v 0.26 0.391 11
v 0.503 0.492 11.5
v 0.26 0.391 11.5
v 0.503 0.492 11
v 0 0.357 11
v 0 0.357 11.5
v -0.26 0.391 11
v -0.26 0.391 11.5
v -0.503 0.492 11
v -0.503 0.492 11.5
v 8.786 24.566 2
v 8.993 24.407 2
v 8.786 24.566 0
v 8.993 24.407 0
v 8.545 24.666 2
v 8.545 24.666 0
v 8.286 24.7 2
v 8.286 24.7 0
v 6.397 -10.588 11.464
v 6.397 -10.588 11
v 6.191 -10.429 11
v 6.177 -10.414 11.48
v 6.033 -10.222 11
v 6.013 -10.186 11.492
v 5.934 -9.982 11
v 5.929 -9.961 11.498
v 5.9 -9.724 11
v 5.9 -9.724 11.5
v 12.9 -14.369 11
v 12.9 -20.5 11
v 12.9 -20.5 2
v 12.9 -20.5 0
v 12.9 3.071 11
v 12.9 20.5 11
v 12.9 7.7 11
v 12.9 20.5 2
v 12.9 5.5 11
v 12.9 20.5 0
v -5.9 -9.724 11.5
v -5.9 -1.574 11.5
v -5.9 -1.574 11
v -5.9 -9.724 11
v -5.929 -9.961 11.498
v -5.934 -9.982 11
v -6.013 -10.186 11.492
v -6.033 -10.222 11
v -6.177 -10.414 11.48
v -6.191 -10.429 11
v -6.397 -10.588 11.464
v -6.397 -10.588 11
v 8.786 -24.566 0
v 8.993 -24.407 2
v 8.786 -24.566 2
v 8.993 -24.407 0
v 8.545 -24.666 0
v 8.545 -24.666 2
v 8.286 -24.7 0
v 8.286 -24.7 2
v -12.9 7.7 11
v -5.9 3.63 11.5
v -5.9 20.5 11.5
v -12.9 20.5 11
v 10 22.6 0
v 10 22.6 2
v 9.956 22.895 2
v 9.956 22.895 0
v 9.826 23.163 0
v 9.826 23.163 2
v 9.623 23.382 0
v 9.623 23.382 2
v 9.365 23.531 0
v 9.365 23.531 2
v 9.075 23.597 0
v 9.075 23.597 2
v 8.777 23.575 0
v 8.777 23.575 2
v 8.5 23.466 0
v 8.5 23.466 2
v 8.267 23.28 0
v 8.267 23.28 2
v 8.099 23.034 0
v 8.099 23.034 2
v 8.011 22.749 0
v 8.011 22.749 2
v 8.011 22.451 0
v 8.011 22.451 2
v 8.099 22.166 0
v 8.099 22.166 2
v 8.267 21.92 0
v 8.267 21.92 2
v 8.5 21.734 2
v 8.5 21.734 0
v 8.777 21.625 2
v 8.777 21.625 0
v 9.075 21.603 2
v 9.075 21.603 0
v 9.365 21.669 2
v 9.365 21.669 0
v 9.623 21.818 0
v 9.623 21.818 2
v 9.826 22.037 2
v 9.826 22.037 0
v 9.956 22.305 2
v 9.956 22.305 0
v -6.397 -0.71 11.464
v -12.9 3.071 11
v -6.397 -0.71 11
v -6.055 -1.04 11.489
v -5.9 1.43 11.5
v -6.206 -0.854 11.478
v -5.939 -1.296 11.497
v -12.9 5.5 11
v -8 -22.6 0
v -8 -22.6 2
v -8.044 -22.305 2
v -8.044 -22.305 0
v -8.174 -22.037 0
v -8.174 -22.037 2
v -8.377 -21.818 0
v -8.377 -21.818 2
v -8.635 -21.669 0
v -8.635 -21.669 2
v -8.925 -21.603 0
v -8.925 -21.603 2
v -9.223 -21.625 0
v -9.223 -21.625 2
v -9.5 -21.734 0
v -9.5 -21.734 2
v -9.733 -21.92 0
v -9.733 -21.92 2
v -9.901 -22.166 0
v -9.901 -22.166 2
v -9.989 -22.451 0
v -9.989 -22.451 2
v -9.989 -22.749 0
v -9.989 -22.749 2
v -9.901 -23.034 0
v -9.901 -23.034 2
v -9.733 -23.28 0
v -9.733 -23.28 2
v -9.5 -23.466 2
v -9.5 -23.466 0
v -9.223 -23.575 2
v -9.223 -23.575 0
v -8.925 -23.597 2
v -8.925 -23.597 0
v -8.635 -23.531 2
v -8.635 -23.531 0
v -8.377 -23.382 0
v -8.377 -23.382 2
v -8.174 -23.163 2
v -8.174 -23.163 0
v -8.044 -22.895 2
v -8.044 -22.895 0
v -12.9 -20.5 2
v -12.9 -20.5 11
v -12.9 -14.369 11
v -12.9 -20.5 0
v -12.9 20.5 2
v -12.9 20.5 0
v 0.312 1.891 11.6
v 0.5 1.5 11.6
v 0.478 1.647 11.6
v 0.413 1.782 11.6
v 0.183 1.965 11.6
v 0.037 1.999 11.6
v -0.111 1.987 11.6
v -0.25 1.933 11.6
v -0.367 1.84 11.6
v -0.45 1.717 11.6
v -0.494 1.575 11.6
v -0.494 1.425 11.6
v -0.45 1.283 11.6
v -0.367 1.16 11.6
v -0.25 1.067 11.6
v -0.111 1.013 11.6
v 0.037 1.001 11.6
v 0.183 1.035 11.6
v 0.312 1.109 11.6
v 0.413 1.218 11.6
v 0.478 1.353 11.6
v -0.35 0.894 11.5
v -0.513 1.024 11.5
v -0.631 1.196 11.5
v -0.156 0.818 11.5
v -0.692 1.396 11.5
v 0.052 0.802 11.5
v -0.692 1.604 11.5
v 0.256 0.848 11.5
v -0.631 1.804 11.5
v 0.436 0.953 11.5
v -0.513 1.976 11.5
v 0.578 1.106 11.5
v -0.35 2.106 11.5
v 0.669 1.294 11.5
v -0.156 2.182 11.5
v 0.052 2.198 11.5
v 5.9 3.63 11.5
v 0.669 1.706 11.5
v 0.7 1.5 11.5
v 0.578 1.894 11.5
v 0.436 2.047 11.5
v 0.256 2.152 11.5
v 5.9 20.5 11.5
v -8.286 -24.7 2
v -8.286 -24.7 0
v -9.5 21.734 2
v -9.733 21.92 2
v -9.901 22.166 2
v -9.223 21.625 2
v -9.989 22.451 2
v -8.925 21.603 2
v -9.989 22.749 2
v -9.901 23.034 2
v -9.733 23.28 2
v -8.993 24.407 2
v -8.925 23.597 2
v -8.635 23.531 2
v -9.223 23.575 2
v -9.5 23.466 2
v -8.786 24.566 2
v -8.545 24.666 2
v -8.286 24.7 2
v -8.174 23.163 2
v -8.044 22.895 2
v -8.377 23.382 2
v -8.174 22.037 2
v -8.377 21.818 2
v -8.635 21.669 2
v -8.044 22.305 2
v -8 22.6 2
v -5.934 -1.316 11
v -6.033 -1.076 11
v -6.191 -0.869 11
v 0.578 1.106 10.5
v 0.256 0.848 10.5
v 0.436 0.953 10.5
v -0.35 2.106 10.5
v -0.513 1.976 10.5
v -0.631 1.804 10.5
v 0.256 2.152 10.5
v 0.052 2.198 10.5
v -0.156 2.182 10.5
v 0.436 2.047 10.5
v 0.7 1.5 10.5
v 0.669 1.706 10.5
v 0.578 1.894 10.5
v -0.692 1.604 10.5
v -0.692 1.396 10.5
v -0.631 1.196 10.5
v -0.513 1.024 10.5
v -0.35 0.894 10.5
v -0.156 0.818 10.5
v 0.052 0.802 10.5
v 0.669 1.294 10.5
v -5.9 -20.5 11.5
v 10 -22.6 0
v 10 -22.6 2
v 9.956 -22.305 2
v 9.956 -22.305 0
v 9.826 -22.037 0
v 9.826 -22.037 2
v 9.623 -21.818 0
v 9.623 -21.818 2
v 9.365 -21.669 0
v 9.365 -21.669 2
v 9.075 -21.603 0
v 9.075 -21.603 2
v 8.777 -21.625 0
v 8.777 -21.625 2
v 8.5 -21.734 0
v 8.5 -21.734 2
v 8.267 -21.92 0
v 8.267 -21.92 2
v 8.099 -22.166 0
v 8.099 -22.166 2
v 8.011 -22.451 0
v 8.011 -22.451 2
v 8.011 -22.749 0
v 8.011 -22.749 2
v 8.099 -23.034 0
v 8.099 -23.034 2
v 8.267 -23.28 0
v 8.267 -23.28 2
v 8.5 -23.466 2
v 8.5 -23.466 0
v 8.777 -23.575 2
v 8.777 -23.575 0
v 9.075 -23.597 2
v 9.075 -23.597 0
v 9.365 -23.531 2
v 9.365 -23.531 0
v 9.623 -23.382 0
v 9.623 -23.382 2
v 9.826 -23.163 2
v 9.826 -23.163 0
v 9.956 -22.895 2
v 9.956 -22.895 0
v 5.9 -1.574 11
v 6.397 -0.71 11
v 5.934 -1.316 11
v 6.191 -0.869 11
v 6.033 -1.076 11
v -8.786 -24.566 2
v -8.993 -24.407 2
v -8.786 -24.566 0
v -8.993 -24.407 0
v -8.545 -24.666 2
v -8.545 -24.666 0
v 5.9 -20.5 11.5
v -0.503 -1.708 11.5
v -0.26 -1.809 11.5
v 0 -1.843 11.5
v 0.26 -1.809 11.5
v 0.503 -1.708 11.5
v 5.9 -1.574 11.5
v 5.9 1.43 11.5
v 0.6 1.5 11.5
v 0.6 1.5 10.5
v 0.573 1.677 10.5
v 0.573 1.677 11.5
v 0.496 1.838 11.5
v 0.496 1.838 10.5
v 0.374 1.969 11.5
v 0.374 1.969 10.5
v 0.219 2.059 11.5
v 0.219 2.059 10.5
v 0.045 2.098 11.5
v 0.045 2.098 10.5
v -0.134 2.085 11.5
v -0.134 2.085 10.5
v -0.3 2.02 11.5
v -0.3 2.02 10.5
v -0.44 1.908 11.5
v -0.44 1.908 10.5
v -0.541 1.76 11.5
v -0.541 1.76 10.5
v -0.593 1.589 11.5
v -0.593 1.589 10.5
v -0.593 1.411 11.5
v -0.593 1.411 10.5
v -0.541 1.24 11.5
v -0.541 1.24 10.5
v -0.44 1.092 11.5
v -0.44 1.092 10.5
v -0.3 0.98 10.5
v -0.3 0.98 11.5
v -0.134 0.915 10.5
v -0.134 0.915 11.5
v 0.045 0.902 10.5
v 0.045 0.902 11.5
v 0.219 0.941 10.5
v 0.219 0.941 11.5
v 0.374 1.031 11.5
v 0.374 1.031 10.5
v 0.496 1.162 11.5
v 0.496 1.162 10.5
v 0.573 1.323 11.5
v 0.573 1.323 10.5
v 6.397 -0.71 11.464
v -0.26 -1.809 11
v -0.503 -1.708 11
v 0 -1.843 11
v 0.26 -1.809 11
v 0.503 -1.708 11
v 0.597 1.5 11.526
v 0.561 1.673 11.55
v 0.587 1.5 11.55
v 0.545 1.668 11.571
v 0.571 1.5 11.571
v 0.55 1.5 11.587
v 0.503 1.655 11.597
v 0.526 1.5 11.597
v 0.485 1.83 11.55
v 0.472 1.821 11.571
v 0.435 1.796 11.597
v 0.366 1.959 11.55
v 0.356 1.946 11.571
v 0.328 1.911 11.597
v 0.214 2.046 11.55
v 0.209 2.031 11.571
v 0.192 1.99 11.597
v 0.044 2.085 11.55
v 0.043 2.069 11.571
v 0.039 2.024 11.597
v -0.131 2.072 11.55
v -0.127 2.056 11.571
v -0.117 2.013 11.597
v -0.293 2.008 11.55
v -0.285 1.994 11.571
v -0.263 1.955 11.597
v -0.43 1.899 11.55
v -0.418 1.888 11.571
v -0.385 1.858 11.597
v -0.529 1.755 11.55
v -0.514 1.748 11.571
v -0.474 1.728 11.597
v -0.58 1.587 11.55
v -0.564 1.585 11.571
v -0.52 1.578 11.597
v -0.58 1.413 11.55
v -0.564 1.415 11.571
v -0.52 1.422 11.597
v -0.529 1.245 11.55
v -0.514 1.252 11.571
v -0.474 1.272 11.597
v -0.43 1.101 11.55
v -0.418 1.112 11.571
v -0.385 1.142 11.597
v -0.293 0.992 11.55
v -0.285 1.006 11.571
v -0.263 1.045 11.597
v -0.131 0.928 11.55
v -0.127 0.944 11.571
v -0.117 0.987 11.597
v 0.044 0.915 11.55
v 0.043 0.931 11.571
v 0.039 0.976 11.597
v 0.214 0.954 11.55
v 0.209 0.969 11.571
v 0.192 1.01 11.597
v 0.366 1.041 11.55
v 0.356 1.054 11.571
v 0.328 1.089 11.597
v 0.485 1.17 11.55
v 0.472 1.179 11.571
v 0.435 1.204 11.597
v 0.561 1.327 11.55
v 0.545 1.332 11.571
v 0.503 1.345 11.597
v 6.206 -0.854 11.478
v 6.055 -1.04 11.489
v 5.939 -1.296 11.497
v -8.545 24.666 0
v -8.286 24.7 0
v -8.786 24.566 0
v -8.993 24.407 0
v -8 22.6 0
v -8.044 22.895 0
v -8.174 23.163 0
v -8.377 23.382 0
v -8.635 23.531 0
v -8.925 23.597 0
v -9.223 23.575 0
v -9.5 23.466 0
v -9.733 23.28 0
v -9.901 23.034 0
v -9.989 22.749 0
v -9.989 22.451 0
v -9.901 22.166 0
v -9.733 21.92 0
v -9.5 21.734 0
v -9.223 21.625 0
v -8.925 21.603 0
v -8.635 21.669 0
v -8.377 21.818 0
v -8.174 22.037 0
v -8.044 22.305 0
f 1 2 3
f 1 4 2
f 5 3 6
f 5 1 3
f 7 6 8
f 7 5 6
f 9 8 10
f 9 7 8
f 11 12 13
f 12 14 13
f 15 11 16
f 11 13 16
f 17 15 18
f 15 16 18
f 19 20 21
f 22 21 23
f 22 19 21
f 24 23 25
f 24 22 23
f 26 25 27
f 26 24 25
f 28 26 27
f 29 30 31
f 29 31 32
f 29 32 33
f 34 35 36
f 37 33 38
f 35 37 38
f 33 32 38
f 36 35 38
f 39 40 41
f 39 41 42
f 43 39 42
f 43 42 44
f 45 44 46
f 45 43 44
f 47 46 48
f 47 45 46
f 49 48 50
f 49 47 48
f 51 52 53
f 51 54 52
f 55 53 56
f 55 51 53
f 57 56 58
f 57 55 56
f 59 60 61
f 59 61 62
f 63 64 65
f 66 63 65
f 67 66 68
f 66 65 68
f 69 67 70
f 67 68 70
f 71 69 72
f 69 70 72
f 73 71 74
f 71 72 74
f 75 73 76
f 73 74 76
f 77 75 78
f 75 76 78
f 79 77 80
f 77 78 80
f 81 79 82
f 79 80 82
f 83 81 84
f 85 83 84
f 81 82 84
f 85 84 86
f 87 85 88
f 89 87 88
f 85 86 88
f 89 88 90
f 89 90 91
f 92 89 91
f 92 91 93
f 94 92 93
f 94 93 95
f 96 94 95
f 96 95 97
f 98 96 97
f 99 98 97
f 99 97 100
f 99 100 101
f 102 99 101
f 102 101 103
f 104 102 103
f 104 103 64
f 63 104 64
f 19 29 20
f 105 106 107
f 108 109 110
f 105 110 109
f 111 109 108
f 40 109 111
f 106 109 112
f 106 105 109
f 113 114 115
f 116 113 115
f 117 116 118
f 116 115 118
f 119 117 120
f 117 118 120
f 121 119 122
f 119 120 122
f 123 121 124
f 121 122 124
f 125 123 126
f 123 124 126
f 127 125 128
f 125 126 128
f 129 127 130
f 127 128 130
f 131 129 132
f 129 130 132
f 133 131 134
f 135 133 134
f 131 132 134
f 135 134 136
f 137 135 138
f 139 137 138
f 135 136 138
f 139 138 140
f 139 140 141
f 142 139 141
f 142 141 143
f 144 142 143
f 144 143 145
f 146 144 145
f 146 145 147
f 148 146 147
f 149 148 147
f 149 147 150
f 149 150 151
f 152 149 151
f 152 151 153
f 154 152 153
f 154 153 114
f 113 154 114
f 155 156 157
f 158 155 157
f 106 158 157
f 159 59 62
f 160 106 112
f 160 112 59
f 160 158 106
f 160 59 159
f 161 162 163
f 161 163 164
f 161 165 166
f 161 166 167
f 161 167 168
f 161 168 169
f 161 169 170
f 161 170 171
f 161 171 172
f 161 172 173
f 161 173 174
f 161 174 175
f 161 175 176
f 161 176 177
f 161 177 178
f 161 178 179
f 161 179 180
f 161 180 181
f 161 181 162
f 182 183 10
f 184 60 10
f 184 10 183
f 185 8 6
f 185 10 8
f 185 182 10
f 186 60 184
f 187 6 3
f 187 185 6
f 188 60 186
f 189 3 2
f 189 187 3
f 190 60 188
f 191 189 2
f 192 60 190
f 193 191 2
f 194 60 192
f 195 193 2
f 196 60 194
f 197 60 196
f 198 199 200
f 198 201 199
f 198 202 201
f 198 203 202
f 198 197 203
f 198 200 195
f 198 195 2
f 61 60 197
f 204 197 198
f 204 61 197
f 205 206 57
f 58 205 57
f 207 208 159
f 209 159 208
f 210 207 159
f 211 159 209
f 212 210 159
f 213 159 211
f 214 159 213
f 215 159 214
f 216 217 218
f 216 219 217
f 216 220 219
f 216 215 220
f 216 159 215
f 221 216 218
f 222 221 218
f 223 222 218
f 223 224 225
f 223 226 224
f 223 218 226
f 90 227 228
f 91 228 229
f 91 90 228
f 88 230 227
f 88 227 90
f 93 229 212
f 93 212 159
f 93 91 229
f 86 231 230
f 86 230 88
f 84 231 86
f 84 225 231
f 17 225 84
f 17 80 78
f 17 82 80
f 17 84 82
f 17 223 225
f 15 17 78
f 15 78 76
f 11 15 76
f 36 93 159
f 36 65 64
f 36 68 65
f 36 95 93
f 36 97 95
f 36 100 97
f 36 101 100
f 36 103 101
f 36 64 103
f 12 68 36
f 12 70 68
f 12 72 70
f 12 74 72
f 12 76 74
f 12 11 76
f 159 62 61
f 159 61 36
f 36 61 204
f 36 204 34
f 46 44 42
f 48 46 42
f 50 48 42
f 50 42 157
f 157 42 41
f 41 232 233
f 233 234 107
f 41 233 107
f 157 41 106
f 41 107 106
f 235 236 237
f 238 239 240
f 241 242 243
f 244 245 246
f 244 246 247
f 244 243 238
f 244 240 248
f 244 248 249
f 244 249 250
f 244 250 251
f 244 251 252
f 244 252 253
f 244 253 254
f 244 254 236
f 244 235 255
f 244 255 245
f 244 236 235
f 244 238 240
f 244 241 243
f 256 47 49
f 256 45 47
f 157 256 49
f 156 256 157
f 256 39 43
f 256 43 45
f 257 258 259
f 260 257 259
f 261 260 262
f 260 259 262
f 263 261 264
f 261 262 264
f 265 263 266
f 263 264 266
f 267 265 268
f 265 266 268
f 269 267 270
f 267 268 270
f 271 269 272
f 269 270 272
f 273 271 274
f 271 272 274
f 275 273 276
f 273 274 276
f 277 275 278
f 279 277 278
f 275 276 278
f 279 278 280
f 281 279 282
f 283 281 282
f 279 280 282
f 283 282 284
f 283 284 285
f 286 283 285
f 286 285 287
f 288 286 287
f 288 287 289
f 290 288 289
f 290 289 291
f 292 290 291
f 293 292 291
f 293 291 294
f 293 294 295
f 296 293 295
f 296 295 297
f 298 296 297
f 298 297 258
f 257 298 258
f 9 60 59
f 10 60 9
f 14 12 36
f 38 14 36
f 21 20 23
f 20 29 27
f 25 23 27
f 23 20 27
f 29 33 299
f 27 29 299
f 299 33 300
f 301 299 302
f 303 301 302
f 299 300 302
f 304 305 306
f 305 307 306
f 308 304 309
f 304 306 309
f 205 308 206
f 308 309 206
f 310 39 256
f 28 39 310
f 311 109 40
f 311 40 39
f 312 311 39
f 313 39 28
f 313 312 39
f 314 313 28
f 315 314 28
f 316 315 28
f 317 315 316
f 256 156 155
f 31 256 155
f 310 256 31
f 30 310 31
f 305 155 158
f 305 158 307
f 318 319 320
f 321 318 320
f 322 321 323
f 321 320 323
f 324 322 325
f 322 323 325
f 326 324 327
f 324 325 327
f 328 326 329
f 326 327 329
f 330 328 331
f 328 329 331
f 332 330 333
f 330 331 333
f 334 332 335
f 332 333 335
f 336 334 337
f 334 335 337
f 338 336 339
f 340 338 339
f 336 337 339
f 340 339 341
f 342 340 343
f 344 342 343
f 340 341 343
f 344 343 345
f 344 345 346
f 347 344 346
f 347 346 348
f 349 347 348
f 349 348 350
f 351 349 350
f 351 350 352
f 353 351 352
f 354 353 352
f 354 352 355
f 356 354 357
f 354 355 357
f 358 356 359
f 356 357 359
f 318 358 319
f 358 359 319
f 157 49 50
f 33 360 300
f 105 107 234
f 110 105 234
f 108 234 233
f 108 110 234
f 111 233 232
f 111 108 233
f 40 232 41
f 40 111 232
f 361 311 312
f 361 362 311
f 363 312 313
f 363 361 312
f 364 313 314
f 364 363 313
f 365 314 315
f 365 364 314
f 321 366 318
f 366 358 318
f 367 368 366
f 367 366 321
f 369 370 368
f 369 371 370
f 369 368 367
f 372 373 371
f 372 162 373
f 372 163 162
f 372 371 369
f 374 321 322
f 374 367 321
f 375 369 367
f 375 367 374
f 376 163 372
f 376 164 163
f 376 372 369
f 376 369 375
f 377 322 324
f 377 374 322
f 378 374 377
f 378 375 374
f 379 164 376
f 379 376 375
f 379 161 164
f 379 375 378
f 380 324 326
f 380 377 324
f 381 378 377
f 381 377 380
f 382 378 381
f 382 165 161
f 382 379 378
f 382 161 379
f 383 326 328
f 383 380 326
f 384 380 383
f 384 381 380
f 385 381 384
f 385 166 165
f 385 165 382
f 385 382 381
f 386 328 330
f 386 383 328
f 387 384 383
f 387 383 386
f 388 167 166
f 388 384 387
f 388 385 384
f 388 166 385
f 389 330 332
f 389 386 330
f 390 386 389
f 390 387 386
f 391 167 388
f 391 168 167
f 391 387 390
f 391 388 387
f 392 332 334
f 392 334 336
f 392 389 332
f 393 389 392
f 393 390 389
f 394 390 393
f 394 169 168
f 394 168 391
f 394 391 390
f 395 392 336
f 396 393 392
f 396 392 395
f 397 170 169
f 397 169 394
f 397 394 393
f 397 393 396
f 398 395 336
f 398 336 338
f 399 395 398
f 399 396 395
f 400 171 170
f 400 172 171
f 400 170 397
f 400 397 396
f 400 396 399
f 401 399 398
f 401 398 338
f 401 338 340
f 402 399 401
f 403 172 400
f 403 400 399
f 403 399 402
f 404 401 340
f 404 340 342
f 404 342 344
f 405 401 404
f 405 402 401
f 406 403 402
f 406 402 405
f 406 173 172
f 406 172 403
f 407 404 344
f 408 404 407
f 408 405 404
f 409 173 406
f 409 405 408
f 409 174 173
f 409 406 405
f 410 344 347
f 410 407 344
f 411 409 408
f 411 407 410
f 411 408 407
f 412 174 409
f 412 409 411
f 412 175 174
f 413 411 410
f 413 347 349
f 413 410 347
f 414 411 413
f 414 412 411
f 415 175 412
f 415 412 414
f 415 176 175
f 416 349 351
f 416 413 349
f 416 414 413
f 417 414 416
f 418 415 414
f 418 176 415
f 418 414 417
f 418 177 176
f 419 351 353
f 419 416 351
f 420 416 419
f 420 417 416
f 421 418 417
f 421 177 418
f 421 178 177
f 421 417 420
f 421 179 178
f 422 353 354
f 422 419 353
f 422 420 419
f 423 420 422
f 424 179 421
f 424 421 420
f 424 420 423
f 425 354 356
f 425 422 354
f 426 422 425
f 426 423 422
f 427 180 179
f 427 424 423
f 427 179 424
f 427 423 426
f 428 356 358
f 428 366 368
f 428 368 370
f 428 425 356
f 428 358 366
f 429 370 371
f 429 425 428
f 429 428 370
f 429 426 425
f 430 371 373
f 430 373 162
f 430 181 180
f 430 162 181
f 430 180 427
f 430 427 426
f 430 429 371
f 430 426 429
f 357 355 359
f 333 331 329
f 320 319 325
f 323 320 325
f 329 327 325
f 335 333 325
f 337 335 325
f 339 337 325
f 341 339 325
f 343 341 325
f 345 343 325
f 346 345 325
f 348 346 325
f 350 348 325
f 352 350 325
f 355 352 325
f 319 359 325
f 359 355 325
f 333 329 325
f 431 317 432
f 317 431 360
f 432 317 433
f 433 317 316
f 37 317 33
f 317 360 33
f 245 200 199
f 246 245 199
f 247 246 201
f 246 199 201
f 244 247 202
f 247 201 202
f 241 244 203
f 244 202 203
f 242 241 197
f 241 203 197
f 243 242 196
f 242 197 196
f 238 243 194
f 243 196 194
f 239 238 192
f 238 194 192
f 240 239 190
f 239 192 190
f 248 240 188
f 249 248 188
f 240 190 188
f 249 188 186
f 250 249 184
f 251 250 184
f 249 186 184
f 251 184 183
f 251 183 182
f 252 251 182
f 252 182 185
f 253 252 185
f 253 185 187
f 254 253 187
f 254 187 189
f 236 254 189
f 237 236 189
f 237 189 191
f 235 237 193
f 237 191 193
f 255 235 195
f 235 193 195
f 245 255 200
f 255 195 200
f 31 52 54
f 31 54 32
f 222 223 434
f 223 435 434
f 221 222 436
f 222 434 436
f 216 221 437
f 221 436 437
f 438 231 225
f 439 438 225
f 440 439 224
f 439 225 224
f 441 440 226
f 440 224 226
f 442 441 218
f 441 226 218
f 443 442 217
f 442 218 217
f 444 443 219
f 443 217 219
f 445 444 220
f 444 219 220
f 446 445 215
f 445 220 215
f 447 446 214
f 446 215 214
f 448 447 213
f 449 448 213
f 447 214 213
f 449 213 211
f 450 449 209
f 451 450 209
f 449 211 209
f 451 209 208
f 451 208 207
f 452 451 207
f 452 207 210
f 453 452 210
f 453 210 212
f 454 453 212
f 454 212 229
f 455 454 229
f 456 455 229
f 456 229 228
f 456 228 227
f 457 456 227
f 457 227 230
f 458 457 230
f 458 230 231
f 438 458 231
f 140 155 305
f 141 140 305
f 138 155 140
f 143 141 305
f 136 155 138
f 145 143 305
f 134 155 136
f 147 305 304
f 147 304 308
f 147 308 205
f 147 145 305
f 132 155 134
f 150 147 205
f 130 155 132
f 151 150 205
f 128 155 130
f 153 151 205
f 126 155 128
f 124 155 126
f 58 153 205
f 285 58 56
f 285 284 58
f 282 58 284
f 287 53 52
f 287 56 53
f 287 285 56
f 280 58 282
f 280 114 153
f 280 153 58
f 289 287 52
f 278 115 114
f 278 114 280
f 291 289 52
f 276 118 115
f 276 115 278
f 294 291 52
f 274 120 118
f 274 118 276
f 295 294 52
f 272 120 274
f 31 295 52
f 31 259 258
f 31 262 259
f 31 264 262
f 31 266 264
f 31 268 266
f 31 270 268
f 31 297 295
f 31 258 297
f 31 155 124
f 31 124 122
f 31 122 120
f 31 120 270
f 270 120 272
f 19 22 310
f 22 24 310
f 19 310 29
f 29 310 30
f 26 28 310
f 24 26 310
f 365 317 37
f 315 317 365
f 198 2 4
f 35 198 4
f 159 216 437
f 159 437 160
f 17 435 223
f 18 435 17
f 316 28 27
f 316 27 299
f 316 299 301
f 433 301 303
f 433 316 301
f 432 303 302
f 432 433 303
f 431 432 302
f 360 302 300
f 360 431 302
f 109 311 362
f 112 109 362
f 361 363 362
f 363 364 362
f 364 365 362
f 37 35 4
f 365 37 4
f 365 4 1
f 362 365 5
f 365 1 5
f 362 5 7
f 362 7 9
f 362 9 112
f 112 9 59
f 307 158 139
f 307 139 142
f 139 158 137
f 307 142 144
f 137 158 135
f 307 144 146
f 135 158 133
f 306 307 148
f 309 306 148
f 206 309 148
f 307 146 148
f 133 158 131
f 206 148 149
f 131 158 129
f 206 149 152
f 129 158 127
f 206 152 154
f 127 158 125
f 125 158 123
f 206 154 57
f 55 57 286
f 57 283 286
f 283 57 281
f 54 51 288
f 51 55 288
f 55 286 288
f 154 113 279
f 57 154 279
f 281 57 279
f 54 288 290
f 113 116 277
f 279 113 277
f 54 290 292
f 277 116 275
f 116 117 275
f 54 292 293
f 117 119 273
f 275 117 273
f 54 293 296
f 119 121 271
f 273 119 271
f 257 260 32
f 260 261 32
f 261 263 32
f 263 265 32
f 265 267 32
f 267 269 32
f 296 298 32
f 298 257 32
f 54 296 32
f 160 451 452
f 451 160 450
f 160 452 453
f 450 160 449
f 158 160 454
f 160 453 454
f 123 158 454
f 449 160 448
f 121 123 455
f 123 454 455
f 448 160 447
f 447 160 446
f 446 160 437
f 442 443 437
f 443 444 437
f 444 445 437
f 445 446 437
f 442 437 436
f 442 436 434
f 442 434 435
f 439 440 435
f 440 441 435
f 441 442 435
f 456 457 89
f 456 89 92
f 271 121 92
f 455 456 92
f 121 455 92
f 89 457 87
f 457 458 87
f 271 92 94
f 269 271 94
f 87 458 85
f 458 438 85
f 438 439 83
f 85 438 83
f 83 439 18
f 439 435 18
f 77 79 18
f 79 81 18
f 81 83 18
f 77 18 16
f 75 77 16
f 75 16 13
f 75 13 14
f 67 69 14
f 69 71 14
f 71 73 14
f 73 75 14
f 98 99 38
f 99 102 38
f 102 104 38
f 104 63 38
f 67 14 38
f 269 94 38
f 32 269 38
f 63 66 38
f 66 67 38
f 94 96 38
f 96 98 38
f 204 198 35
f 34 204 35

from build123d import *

# Parameters (mm, degrees)
SKETCH_1_W          = 25.8
SKETCH_1_H          = 49.4
EXTRUDE_1_DEPTH     = 11.5
SKETCH_2_W          = 65.082763186
SKETCH_2_H          = 29.72436647
SKETCH_2_W_2        = 74.485765389
SKETCH_2_H_2        = 30.540329471
CUT_EXTRUDE_1_DEPTH = 9.5
SKETCH_3_R          = 1
CUT_EXTRUDE_3_DEPTH = 11.5
CUT_EXTRUDE_4_DEPTH = 11.5
CUT_EXTRUDE_5_DEPTH = 62.5
SKETCH_6_R          = 0.7
CUT_EXTRUDE_6_DEPTH = 1
SKETCH_7_R          = 0.6
EXTRUDE_2_DEPTH     = 1.1
FILLET_1_R          = 0.1
CUT_EXTRUDE_7_DEPTH = 0.5
CUT_EXTRUDE_8_DEPTH = 0.5
FILLET_2_R          = 1
FILLET_3_R          = 1
FILLET_4_R          = 1


with BuildPart() as part:
    # 草图1 → 凸台-拉伸1 (new body)
    with BuildSketch(Plane.XY):
        Rectangle(SKETCH_1_W, SKETCH_1_H)
    extrude(amount=EXTRUDE_1_DEPTH)

    # 草图2 → 切除-拉伸1 (cut)
    with BuildSketch(Plane.XY.offset(11.5)):
        with Locations((5.938113154, 35.362183235)):
            Rectangle(SKETCH_2_W, SKETCH_2_H)
        with Locations((7.608894538, -35.770164736)):
            Rectangle(SKETCH_2_W_2, SKETCH_2_H_2)
    extrude(amount=-CUT_EXTRUDE_1_DEPTH, mode=Mode.SUBTRACT)

    # 草图3 → 切除-拉伸3 (cut)
    with BuildSketch(Plane.XY.offset(11.5)):
        with Locations((9, -22.6)):
            Circle(SKETCH_3_R)
        with Locations((-9, -22.6)):
            Circle(SKETCH_3_R)
        with Locations((-9, 22.6)):
            Circle(SKETCH_3_R)
        with Locations((9, 22.6)):
            Circle(SKETCH_3_R)
    extrude(amount=-CUT_EXTRUDE_3_DEPTH, mode=Mode.SUBTRACT)

    # 草图4 → 切除-拉伸4 (cut)
    with BuildSketch(Plane.XY.offset(2)):
        Polygon((8.7, 24.7), (12.9, 20.5), (12.9, 24.7), align=None)
        Polygon((-8.7, 24.7), (-12.9, 20.5), (-12.9, 24.7), align=None)
        Polygon((-12.9, -24.7), (-12.9, -20.5), (-8.7, -24.7), align=None)
        Polygon((12.9, -24.7), (8.7, -24.7), (12.9, -20.5), align=None)
    extrude(amount=-CUT_EXTRUDE_4_DEPTH, mode=Mode.SUBTRACT)

    # 草图5 → 切除-拉伸5 (cut)
    with BuildSketch(Plane.XZ.offset(20.5)):
        Polygon((5.9, 11.5), (12.9, 11), (12.9, 11.5), align=None)
        Polygon((-12.9, 11), (-12.9, 11.5), (-5.9, 11.5), align=None)
    extrude(amount=-CUT_EXTRUDE_5_DEPTH, mode=Mode.SUBTRACT)

    # 草图6 → 切除-拉伸6 (cut)
    with BuildSketch(Plane.XY.offset(11.5)):
        with Locations((0, 1.5)):
            Circle(SKETCH_6_R)
    extrude(amount=-CUT_EXTRUDE_6_DEPTH, mode=Mode.SUBTRACT)

    # 草图8 → 切除-拉伸7 (cut)
    with BuildSketch(Plane.XY.offset(11.5)):
        Polygon((0, 0.2), (12.9, 7.7), (12.9, 5.5), (0, -2), (-12.9, 5.5), (-12.9, 7.7), align=None)
    extrude(amount=-CUT_EXTRUDE_7_DEPTH, mode=Mode.SUBTRACT)

    # 草图9 → 切除-拉伸8 (cut)
    with BuildSketch(Plane.XY.offset(11.5)):
        with BuildLine():
            Line((6.397379543, -0.709722893), (12.9, 3.070870396))
            Line((12.9, 3.070870396), (12.9, -14.368664488))
            Line((12.9, -14.368664488), (6.397379543, -10.588071198))
            ThreePointArc((6.397379543, -10.588071198), (6.033218465, -10.222252062), (5.9, -9.723564012))
            Line((5.9, -9.723564012), (5.9, -1.57423008))
            ThreePointArc((5.9, -1.57423008), (6.033218465, -1.07554203), (6.397379543, -0.709722893))
        make_face()
        with BuildLine():
            Line((-5.9, -1.57423008), (-5.9, -9.723564012))
            ThreePointArc((-5.9, -9.723564012), (-6.033218465, -10.222252062), (-6.397379543, -10.588071198))
            Line((-6.397379543, -10.588071198), (-12.9, -14.368664488))
            Line((-12.9, -14.368664488), (-12.9, 3.070870396))
            Line((-12.9, 3.070870396), (-6.397379543, -0.709722893))
            ThreePointArc((-6.397379543, -0.709722893), (-6.033218465, -1.07554203), (-5.9, -1.57423008))
        make_face()
    extrude(amount=-CUT_EXTRUDE_8_DEPTH, mode=Mode.SUBTRACT)

    # 圆角2
    fillet_2_edges = [part.edges().sort_by_distance(p)[0] for p in [
        (0, -2, 11.25),
        (0, 0.2, 11.25),
    ]]
    fillet(fillet_2_edges, radius=FILLET_2_R)

    # 圆角3
    fillet_3_edges = [part.edges().sort_by_distance(p)[0] for p in [
        (8.7, -24.7, 1),
        (-8.7, -24.7, 1),
    ]]
    fillet(fillet_3_edges, radius=FILLET_3_R)

    # 圆角4
    fillet_4_edges = [part.edges().sort_by_distance(p)[0] for p in [
        (8.7, 24.7, 1),
        (-8.7, 24.7, 1),
    ]]
    fillet(fillet_4_edges, radius=FILLET_4_R)


with BuildPart() as body_2:
    # 草图7 → 凸台-拉伸2 (new body)
    with BuildSketch(Plane.XY.offset(10.5)):
        with Locations((0, 1.5)):
            Circle(SKETCH_7_R)
    extrude(amount=EXTRUDE_2_DEPTH)

    # 圆角1
    fillet_1_edges = [body_2.edges().sort_by_distance(p)[0] for p in [
        (-0.6, 1.5, 11.6),
    ]]
    fillet(fillet_1_edges, radius=FILLET_1_R)


solid = Compound([part.part, body_2.part])
